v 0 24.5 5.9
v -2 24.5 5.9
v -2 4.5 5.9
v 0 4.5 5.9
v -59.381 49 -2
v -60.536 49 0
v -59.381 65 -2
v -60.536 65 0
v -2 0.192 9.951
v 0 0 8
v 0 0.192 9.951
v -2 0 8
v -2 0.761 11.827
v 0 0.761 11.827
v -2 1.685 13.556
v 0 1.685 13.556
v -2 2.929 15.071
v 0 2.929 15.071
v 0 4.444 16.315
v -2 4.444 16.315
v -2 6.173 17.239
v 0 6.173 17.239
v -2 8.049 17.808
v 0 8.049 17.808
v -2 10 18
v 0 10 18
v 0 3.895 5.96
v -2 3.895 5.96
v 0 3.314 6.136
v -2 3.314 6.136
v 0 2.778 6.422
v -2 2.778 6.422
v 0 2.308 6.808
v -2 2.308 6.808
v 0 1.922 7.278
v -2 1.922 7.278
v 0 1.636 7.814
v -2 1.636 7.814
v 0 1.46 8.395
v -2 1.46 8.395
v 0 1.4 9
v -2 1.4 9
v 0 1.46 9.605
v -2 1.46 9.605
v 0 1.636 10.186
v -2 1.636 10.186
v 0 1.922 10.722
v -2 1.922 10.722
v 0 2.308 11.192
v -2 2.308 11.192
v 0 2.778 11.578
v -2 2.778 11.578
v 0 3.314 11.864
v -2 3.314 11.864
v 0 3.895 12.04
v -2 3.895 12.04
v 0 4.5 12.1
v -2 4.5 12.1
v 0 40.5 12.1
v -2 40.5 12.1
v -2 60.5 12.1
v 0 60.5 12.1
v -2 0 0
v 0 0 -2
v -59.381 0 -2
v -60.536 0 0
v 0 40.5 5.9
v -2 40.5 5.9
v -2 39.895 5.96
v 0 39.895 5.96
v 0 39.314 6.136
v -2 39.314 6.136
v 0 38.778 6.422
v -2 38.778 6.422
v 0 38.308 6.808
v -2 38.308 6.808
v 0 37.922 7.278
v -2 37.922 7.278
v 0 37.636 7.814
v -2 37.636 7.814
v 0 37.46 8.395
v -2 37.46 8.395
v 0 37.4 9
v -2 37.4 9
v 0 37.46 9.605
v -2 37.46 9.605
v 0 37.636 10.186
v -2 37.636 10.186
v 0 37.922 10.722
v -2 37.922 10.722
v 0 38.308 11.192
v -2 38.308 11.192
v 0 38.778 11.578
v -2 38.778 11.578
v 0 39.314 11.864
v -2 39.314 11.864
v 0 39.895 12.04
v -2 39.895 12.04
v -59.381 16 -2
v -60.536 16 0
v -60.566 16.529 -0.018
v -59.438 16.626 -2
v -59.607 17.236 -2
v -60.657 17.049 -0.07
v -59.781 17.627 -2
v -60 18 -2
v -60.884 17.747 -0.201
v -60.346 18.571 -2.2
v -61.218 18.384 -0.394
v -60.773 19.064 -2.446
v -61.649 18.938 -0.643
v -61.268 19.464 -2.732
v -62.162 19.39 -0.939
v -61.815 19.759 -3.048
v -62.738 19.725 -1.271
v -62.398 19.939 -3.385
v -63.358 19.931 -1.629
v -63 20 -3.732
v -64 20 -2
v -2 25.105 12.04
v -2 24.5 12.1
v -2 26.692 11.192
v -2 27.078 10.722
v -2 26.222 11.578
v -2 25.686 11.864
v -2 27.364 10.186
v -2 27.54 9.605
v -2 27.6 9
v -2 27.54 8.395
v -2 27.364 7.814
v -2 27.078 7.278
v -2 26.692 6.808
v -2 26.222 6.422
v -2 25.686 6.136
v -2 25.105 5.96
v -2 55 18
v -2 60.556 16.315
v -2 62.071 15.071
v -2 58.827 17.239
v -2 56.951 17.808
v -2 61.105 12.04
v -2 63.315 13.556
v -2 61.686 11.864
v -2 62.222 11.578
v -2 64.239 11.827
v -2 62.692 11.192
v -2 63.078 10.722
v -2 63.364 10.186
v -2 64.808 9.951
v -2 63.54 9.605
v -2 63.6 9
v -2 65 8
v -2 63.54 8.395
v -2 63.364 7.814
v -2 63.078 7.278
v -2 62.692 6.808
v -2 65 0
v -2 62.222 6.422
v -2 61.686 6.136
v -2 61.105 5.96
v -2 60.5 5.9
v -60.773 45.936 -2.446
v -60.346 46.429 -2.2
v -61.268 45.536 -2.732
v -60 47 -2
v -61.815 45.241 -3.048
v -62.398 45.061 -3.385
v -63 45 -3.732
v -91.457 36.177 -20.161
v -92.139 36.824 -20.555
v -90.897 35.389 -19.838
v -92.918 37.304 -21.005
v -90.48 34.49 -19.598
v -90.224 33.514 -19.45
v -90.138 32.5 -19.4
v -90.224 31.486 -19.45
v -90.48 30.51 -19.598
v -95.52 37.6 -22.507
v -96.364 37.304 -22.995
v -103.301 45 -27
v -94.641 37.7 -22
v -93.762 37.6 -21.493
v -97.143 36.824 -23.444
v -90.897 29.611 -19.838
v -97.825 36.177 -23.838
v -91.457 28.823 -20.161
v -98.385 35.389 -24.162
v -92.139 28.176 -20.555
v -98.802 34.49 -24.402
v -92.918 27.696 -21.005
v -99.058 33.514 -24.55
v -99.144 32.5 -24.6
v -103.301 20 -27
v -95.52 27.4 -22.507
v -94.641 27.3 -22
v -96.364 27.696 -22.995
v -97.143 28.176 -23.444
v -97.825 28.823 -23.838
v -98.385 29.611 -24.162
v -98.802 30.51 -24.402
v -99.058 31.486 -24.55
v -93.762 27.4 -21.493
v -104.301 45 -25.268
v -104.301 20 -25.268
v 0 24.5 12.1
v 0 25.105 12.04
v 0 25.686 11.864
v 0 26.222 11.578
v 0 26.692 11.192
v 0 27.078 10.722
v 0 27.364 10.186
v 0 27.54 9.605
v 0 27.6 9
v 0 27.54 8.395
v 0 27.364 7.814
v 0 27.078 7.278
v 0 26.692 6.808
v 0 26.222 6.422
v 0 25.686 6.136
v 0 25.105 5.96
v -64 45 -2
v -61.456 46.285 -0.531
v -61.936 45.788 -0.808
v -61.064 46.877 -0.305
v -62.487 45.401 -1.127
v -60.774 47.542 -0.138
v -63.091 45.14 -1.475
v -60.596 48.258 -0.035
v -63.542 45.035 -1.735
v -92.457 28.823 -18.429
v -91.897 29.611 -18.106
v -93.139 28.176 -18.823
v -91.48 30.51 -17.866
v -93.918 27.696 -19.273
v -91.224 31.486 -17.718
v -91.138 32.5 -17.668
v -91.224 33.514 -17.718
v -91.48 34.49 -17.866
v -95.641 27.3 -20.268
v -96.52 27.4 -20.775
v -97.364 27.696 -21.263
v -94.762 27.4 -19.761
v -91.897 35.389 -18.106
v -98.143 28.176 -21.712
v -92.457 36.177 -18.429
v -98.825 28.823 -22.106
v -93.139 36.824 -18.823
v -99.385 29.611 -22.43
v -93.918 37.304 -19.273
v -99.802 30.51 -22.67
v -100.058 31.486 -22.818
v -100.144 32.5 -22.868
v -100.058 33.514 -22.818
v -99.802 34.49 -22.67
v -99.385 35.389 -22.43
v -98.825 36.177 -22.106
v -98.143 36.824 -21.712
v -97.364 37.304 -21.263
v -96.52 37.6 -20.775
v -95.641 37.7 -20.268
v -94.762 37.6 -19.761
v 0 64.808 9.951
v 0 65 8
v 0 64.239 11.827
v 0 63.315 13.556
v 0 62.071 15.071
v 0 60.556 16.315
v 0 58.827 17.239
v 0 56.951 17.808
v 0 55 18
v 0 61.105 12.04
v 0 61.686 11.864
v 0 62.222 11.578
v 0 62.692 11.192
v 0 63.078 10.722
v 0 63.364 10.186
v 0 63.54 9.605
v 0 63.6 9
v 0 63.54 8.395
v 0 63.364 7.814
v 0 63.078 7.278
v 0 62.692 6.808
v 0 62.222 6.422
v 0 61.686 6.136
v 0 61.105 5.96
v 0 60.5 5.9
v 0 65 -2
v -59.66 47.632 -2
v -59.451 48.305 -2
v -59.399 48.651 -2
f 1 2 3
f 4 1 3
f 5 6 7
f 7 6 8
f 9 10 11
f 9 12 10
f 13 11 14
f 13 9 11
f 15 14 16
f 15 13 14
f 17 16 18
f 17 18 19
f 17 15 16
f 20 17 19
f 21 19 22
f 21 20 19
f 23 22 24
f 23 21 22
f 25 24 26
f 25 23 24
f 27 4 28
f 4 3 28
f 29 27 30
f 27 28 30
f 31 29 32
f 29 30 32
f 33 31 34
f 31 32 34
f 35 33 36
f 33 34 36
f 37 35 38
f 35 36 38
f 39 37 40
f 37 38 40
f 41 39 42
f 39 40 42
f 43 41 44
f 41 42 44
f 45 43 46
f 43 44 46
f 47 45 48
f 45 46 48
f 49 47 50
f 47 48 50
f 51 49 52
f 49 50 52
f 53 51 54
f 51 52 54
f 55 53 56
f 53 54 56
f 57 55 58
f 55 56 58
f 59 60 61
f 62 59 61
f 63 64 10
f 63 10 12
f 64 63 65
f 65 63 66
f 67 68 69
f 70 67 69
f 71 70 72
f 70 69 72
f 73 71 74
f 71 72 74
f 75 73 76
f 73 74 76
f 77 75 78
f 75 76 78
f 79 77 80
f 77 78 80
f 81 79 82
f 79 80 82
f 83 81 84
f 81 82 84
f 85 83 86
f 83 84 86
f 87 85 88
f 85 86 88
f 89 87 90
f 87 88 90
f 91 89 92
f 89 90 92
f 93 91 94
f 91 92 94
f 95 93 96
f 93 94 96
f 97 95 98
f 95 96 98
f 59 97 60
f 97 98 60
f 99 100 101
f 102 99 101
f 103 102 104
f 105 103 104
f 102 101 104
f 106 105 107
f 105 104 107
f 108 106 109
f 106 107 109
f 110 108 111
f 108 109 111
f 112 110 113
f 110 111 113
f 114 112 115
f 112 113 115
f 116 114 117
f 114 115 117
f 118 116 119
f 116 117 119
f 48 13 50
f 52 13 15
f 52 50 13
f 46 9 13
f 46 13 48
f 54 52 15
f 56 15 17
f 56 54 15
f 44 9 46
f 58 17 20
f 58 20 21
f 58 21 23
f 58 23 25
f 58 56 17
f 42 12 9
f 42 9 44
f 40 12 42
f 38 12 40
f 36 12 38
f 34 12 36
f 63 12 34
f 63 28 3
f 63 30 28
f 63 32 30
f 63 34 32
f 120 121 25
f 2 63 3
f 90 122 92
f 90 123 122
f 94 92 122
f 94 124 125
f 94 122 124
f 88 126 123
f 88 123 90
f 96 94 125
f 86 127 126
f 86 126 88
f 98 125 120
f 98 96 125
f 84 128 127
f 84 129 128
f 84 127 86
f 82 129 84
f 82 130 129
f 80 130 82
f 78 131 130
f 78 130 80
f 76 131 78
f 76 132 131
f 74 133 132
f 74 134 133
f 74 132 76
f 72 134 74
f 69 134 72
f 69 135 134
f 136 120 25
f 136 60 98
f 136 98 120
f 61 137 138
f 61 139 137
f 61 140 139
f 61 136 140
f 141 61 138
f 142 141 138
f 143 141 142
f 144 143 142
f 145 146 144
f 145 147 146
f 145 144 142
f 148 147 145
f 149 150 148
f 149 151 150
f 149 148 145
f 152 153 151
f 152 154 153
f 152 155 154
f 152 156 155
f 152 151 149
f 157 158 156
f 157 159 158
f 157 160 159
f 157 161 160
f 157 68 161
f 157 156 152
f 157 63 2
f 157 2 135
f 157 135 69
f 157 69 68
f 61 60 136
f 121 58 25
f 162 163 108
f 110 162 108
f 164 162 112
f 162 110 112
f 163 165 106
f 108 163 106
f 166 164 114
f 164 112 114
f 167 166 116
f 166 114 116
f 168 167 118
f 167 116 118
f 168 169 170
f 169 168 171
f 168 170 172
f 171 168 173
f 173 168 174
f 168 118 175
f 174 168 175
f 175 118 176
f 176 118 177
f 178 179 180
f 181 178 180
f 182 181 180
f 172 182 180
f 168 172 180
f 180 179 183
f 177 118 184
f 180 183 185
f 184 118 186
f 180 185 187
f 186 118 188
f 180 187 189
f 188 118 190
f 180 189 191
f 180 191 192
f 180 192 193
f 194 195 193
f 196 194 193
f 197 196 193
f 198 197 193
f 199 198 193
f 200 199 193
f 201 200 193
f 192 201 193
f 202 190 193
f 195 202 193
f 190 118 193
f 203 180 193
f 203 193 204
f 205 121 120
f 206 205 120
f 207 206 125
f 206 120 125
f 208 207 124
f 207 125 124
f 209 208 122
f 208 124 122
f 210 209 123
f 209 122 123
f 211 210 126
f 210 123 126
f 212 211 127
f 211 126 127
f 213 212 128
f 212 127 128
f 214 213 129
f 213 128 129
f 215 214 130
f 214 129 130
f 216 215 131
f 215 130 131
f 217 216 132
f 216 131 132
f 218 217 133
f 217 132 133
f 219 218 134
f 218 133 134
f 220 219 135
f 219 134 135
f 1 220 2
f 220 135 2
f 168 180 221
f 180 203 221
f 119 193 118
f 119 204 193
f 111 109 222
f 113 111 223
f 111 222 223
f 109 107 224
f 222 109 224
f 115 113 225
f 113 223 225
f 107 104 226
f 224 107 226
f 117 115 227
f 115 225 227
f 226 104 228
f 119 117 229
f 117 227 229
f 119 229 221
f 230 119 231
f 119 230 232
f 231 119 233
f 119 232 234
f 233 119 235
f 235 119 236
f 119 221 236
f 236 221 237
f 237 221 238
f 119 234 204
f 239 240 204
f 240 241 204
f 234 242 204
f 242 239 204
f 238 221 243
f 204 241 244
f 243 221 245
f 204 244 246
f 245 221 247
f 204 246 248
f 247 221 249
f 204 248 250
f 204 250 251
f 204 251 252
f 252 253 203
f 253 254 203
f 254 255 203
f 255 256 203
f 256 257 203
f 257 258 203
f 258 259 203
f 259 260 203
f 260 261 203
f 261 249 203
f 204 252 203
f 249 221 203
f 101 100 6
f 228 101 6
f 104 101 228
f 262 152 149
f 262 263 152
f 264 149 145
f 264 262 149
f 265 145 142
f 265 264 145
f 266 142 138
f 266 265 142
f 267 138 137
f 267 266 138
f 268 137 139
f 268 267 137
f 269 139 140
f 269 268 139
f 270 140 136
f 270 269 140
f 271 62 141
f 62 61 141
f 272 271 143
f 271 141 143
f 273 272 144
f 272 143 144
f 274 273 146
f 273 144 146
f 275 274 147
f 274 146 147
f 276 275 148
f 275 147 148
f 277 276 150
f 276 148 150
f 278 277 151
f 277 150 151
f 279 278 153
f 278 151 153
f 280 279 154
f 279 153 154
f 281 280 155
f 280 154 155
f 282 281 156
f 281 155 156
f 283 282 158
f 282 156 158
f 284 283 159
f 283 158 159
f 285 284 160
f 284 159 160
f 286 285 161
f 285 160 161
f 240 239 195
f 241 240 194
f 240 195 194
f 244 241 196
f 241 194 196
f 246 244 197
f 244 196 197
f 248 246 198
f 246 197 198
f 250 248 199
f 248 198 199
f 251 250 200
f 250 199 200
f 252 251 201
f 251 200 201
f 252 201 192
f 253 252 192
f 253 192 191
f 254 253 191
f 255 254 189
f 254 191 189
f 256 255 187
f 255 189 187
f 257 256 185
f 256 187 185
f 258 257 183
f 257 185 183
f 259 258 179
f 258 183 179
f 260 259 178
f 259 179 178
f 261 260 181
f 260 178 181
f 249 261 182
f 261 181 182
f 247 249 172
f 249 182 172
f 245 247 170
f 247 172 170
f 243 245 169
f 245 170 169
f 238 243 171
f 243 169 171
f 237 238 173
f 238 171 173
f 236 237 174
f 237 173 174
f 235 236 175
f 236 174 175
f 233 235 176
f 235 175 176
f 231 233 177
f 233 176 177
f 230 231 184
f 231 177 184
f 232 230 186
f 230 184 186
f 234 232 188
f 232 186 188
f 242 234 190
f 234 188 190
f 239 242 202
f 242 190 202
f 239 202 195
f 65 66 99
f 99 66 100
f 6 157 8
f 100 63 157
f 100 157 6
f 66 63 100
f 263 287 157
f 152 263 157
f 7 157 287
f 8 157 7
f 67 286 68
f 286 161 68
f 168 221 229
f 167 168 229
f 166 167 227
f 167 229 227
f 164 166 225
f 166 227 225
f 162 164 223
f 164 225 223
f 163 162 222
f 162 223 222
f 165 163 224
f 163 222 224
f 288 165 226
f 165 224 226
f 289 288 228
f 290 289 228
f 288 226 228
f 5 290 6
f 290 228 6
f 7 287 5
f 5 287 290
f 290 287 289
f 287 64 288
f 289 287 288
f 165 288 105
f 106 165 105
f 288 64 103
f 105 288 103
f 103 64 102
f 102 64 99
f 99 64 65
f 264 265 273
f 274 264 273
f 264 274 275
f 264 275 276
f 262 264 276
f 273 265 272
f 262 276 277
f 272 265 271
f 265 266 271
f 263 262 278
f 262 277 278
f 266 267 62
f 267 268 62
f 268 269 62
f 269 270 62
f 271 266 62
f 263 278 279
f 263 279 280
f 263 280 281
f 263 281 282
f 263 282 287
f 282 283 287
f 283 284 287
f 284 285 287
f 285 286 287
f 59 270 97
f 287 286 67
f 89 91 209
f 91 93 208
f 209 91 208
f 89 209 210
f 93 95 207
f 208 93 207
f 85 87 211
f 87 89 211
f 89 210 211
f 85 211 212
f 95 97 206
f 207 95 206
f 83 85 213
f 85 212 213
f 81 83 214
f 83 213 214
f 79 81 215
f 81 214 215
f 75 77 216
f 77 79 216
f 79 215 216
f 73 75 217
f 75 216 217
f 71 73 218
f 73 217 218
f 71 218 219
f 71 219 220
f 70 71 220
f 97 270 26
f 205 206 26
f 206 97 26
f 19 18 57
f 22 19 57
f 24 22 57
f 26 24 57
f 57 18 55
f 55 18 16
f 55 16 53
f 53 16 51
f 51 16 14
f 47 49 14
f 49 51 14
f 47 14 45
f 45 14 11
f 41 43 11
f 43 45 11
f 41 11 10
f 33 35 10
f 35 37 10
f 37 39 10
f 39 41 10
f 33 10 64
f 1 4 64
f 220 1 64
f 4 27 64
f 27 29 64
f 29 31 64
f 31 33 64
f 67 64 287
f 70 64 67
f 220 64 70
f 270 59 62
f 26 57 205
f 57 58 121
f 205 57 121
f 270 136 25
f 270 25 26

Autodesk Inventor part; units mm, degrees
ref_plane "YZ Plane" through (0, 0, 0) normal (1, 0, 0) x (0, 1, 0)
ref_plane "XZ Plane" through (0, 0, 0) normal (0, 1, 0) x (-1, 0, 0)
ref_plane "XY Plane" through (0, 0, 0) normal (0, 0, 1) x (1, 0, 0)
sketch "Skizze1" plane through (0, 0, 0) normal (0, 1, 0) x (-1, 0, 0)
  line L0 (0, 0) -> (0, -2)
  line L1 (0, -2) -> (60, -2)
  line L2 (60, -2) -> (103.3013, -27)
  line L3 (103.3013, -27) -> (104.3013, -25.2679)
  line L4 (0, 0) -> (60.5359, 0)
  line L5 (104.3013, -25.2679) -> (60.5359, 0)
  dimension "d0" = 2
  dimension "d1" = 60
  dimension "d2" = 50
  dimension "d3" = 150
  dimension "d4" = 2
  dimension "d42" = 0
extrude "Extrusion1" add sketch "Skizze1" along normal blind 65
sketch "Skizze2" plane through (-60.5359, 0, 0) normal (0, 0, 1) x (1, 0, 0)
  line L0 (60.5359, 0) -> (0.5359, 0) projected
  line L1 (60.5359, 0) -> (58.5359, 0)
  line L2 (58.5359, 0) -> (58.5359, 65)
  line L3 (58.5359, 65) -> (60.5359, 65)
  line L4 (60.5359, 65) -> (60.5359, 0)
  point P0 (58.5359, 0)
  dimension "d8" = 2
  dimension "d9" = 65
extrude "Extrusion2" add sketch "Skizze2" along normal blind 18
sketch "Skizze3" plane through (-2, 0, 0) normal (-1, 0, 0) x (0, 0, 1)
  line L0 (0, 0) -> (18, 0) projected
  line L1 (18, 65) -> (18, 0) projected
  line L2 (9, 24.5) -> (9, 4.5) construction
  line L3 (5.9, 24.5) -> (5.9, 4.5)
  line L4 (12.1, 4.5) -> (12.1, 24.5)
  arc A0 (12.1, 24.5) -> (5.9, 24.5) centre (9, 24.5) ccw
  arc A1 (5.9, 4.5) -> (12.1, 4.5) centre (9, 4.5) ccw
  line L5 (9, 60.5) -> (9, 40.5) construction
  line L6 (5.9, 60.5) -> (5.9, 40.5)
  line L7 (12.1, 40.5) -> (12.1, 60.5)
  arc A2 (12.1, 60.5) -> (5.9, 60.5) centre (9, 60.5) ccw
  arc A3 (5.9, 40.5) -> (12.1, 40.5) centre (9, 40.5) ccw
  line L8 (0, 0) -> (0, 65) projected
  point P0 (9, 14.5)
  point P1 (9, 50.5)
  dimension "d12" = 36
  dimension "d32" = 6.2
  dimension "d34" = 20
  dimension "d35" = 14.5
  dimension "d36" = 6.2
  dimension "d37" = 20
  dimension "d43" = 9
  dimension "d44" = 18
sketch "Skizze4" plane through (-60.5359, 0, 0) normal (-0.5, 0, 0.8660254) x (0.8660254, 0, 0.5)
  line L0 (-50.5359, 0) -> (0, 0) projected
  line L1 (-50.5359, 0) -> (-50.5359, 65) projected
  point P0 (52.4256, 0)
  point P1 (-40.5359, 32.5)
  dimension "d23" = 32.5
  dimension "d24" = 10
hole "Bohrung2" at (-95.641, 32.5, -20.2679) direction (0.5, 0, -0.8660254) diameter 10.4 end through all
extrude "Extrusion3" cut sketch "Skizze3" against normal blind 10
fillet "Rundung1" radius 10 4 edges at (-103.8013, 65, -26.134) (-103.8013, 0, -26.134) (-1, 0, 18) (-1, 65, 18)
sketch "Skizze6" plane through (-60.5359, 0, 0) normal (-0.5, 0, 0.8660254) x (0.8660254, 0, 0.5)
  line L0 (0, 0) -> (0, 65) projected
  line L1 (0, 0) -> (-50.536, 0)
  line L2 (-50.536, 0) -> (-50.536, 20)
  line L3 (-50.536, 20) -> (0, 20)
  line L4 (0, 20) -> (0, 0)
  line L5 (-40.5359, 65) -> (0, 65) projected
  line L6 (0, 65) -> (-50.536, 65)
  line L7 (-50.536, 65) -> (-50.536, 45)
  line L8 (-50.536, 45) -> (0, 45)
  line L9 (0, 45) -> (0, 65)
  point P0 (52.4256, 0)
  point P1 (0, 45)
  point P2 (0, 20)
  dimension "d46" = 50.536
  dimension "d47" = 20
  dimension "d48" = 50.536
  dimension "d49" = 20
extrude "Extrusion4" cut sketch "Skizze6" against normal blind 10
fillet "Rundung2" radius 4 2 edges at (-59.9585, 20, -1) (-59.9585, 45, -1)
equation "\"d36\" = d32"
equation "\"d37\" = d34"
equation "\"d43\" = 0.5 * d44"
properties part number "Lampenhalterung 2,0"
